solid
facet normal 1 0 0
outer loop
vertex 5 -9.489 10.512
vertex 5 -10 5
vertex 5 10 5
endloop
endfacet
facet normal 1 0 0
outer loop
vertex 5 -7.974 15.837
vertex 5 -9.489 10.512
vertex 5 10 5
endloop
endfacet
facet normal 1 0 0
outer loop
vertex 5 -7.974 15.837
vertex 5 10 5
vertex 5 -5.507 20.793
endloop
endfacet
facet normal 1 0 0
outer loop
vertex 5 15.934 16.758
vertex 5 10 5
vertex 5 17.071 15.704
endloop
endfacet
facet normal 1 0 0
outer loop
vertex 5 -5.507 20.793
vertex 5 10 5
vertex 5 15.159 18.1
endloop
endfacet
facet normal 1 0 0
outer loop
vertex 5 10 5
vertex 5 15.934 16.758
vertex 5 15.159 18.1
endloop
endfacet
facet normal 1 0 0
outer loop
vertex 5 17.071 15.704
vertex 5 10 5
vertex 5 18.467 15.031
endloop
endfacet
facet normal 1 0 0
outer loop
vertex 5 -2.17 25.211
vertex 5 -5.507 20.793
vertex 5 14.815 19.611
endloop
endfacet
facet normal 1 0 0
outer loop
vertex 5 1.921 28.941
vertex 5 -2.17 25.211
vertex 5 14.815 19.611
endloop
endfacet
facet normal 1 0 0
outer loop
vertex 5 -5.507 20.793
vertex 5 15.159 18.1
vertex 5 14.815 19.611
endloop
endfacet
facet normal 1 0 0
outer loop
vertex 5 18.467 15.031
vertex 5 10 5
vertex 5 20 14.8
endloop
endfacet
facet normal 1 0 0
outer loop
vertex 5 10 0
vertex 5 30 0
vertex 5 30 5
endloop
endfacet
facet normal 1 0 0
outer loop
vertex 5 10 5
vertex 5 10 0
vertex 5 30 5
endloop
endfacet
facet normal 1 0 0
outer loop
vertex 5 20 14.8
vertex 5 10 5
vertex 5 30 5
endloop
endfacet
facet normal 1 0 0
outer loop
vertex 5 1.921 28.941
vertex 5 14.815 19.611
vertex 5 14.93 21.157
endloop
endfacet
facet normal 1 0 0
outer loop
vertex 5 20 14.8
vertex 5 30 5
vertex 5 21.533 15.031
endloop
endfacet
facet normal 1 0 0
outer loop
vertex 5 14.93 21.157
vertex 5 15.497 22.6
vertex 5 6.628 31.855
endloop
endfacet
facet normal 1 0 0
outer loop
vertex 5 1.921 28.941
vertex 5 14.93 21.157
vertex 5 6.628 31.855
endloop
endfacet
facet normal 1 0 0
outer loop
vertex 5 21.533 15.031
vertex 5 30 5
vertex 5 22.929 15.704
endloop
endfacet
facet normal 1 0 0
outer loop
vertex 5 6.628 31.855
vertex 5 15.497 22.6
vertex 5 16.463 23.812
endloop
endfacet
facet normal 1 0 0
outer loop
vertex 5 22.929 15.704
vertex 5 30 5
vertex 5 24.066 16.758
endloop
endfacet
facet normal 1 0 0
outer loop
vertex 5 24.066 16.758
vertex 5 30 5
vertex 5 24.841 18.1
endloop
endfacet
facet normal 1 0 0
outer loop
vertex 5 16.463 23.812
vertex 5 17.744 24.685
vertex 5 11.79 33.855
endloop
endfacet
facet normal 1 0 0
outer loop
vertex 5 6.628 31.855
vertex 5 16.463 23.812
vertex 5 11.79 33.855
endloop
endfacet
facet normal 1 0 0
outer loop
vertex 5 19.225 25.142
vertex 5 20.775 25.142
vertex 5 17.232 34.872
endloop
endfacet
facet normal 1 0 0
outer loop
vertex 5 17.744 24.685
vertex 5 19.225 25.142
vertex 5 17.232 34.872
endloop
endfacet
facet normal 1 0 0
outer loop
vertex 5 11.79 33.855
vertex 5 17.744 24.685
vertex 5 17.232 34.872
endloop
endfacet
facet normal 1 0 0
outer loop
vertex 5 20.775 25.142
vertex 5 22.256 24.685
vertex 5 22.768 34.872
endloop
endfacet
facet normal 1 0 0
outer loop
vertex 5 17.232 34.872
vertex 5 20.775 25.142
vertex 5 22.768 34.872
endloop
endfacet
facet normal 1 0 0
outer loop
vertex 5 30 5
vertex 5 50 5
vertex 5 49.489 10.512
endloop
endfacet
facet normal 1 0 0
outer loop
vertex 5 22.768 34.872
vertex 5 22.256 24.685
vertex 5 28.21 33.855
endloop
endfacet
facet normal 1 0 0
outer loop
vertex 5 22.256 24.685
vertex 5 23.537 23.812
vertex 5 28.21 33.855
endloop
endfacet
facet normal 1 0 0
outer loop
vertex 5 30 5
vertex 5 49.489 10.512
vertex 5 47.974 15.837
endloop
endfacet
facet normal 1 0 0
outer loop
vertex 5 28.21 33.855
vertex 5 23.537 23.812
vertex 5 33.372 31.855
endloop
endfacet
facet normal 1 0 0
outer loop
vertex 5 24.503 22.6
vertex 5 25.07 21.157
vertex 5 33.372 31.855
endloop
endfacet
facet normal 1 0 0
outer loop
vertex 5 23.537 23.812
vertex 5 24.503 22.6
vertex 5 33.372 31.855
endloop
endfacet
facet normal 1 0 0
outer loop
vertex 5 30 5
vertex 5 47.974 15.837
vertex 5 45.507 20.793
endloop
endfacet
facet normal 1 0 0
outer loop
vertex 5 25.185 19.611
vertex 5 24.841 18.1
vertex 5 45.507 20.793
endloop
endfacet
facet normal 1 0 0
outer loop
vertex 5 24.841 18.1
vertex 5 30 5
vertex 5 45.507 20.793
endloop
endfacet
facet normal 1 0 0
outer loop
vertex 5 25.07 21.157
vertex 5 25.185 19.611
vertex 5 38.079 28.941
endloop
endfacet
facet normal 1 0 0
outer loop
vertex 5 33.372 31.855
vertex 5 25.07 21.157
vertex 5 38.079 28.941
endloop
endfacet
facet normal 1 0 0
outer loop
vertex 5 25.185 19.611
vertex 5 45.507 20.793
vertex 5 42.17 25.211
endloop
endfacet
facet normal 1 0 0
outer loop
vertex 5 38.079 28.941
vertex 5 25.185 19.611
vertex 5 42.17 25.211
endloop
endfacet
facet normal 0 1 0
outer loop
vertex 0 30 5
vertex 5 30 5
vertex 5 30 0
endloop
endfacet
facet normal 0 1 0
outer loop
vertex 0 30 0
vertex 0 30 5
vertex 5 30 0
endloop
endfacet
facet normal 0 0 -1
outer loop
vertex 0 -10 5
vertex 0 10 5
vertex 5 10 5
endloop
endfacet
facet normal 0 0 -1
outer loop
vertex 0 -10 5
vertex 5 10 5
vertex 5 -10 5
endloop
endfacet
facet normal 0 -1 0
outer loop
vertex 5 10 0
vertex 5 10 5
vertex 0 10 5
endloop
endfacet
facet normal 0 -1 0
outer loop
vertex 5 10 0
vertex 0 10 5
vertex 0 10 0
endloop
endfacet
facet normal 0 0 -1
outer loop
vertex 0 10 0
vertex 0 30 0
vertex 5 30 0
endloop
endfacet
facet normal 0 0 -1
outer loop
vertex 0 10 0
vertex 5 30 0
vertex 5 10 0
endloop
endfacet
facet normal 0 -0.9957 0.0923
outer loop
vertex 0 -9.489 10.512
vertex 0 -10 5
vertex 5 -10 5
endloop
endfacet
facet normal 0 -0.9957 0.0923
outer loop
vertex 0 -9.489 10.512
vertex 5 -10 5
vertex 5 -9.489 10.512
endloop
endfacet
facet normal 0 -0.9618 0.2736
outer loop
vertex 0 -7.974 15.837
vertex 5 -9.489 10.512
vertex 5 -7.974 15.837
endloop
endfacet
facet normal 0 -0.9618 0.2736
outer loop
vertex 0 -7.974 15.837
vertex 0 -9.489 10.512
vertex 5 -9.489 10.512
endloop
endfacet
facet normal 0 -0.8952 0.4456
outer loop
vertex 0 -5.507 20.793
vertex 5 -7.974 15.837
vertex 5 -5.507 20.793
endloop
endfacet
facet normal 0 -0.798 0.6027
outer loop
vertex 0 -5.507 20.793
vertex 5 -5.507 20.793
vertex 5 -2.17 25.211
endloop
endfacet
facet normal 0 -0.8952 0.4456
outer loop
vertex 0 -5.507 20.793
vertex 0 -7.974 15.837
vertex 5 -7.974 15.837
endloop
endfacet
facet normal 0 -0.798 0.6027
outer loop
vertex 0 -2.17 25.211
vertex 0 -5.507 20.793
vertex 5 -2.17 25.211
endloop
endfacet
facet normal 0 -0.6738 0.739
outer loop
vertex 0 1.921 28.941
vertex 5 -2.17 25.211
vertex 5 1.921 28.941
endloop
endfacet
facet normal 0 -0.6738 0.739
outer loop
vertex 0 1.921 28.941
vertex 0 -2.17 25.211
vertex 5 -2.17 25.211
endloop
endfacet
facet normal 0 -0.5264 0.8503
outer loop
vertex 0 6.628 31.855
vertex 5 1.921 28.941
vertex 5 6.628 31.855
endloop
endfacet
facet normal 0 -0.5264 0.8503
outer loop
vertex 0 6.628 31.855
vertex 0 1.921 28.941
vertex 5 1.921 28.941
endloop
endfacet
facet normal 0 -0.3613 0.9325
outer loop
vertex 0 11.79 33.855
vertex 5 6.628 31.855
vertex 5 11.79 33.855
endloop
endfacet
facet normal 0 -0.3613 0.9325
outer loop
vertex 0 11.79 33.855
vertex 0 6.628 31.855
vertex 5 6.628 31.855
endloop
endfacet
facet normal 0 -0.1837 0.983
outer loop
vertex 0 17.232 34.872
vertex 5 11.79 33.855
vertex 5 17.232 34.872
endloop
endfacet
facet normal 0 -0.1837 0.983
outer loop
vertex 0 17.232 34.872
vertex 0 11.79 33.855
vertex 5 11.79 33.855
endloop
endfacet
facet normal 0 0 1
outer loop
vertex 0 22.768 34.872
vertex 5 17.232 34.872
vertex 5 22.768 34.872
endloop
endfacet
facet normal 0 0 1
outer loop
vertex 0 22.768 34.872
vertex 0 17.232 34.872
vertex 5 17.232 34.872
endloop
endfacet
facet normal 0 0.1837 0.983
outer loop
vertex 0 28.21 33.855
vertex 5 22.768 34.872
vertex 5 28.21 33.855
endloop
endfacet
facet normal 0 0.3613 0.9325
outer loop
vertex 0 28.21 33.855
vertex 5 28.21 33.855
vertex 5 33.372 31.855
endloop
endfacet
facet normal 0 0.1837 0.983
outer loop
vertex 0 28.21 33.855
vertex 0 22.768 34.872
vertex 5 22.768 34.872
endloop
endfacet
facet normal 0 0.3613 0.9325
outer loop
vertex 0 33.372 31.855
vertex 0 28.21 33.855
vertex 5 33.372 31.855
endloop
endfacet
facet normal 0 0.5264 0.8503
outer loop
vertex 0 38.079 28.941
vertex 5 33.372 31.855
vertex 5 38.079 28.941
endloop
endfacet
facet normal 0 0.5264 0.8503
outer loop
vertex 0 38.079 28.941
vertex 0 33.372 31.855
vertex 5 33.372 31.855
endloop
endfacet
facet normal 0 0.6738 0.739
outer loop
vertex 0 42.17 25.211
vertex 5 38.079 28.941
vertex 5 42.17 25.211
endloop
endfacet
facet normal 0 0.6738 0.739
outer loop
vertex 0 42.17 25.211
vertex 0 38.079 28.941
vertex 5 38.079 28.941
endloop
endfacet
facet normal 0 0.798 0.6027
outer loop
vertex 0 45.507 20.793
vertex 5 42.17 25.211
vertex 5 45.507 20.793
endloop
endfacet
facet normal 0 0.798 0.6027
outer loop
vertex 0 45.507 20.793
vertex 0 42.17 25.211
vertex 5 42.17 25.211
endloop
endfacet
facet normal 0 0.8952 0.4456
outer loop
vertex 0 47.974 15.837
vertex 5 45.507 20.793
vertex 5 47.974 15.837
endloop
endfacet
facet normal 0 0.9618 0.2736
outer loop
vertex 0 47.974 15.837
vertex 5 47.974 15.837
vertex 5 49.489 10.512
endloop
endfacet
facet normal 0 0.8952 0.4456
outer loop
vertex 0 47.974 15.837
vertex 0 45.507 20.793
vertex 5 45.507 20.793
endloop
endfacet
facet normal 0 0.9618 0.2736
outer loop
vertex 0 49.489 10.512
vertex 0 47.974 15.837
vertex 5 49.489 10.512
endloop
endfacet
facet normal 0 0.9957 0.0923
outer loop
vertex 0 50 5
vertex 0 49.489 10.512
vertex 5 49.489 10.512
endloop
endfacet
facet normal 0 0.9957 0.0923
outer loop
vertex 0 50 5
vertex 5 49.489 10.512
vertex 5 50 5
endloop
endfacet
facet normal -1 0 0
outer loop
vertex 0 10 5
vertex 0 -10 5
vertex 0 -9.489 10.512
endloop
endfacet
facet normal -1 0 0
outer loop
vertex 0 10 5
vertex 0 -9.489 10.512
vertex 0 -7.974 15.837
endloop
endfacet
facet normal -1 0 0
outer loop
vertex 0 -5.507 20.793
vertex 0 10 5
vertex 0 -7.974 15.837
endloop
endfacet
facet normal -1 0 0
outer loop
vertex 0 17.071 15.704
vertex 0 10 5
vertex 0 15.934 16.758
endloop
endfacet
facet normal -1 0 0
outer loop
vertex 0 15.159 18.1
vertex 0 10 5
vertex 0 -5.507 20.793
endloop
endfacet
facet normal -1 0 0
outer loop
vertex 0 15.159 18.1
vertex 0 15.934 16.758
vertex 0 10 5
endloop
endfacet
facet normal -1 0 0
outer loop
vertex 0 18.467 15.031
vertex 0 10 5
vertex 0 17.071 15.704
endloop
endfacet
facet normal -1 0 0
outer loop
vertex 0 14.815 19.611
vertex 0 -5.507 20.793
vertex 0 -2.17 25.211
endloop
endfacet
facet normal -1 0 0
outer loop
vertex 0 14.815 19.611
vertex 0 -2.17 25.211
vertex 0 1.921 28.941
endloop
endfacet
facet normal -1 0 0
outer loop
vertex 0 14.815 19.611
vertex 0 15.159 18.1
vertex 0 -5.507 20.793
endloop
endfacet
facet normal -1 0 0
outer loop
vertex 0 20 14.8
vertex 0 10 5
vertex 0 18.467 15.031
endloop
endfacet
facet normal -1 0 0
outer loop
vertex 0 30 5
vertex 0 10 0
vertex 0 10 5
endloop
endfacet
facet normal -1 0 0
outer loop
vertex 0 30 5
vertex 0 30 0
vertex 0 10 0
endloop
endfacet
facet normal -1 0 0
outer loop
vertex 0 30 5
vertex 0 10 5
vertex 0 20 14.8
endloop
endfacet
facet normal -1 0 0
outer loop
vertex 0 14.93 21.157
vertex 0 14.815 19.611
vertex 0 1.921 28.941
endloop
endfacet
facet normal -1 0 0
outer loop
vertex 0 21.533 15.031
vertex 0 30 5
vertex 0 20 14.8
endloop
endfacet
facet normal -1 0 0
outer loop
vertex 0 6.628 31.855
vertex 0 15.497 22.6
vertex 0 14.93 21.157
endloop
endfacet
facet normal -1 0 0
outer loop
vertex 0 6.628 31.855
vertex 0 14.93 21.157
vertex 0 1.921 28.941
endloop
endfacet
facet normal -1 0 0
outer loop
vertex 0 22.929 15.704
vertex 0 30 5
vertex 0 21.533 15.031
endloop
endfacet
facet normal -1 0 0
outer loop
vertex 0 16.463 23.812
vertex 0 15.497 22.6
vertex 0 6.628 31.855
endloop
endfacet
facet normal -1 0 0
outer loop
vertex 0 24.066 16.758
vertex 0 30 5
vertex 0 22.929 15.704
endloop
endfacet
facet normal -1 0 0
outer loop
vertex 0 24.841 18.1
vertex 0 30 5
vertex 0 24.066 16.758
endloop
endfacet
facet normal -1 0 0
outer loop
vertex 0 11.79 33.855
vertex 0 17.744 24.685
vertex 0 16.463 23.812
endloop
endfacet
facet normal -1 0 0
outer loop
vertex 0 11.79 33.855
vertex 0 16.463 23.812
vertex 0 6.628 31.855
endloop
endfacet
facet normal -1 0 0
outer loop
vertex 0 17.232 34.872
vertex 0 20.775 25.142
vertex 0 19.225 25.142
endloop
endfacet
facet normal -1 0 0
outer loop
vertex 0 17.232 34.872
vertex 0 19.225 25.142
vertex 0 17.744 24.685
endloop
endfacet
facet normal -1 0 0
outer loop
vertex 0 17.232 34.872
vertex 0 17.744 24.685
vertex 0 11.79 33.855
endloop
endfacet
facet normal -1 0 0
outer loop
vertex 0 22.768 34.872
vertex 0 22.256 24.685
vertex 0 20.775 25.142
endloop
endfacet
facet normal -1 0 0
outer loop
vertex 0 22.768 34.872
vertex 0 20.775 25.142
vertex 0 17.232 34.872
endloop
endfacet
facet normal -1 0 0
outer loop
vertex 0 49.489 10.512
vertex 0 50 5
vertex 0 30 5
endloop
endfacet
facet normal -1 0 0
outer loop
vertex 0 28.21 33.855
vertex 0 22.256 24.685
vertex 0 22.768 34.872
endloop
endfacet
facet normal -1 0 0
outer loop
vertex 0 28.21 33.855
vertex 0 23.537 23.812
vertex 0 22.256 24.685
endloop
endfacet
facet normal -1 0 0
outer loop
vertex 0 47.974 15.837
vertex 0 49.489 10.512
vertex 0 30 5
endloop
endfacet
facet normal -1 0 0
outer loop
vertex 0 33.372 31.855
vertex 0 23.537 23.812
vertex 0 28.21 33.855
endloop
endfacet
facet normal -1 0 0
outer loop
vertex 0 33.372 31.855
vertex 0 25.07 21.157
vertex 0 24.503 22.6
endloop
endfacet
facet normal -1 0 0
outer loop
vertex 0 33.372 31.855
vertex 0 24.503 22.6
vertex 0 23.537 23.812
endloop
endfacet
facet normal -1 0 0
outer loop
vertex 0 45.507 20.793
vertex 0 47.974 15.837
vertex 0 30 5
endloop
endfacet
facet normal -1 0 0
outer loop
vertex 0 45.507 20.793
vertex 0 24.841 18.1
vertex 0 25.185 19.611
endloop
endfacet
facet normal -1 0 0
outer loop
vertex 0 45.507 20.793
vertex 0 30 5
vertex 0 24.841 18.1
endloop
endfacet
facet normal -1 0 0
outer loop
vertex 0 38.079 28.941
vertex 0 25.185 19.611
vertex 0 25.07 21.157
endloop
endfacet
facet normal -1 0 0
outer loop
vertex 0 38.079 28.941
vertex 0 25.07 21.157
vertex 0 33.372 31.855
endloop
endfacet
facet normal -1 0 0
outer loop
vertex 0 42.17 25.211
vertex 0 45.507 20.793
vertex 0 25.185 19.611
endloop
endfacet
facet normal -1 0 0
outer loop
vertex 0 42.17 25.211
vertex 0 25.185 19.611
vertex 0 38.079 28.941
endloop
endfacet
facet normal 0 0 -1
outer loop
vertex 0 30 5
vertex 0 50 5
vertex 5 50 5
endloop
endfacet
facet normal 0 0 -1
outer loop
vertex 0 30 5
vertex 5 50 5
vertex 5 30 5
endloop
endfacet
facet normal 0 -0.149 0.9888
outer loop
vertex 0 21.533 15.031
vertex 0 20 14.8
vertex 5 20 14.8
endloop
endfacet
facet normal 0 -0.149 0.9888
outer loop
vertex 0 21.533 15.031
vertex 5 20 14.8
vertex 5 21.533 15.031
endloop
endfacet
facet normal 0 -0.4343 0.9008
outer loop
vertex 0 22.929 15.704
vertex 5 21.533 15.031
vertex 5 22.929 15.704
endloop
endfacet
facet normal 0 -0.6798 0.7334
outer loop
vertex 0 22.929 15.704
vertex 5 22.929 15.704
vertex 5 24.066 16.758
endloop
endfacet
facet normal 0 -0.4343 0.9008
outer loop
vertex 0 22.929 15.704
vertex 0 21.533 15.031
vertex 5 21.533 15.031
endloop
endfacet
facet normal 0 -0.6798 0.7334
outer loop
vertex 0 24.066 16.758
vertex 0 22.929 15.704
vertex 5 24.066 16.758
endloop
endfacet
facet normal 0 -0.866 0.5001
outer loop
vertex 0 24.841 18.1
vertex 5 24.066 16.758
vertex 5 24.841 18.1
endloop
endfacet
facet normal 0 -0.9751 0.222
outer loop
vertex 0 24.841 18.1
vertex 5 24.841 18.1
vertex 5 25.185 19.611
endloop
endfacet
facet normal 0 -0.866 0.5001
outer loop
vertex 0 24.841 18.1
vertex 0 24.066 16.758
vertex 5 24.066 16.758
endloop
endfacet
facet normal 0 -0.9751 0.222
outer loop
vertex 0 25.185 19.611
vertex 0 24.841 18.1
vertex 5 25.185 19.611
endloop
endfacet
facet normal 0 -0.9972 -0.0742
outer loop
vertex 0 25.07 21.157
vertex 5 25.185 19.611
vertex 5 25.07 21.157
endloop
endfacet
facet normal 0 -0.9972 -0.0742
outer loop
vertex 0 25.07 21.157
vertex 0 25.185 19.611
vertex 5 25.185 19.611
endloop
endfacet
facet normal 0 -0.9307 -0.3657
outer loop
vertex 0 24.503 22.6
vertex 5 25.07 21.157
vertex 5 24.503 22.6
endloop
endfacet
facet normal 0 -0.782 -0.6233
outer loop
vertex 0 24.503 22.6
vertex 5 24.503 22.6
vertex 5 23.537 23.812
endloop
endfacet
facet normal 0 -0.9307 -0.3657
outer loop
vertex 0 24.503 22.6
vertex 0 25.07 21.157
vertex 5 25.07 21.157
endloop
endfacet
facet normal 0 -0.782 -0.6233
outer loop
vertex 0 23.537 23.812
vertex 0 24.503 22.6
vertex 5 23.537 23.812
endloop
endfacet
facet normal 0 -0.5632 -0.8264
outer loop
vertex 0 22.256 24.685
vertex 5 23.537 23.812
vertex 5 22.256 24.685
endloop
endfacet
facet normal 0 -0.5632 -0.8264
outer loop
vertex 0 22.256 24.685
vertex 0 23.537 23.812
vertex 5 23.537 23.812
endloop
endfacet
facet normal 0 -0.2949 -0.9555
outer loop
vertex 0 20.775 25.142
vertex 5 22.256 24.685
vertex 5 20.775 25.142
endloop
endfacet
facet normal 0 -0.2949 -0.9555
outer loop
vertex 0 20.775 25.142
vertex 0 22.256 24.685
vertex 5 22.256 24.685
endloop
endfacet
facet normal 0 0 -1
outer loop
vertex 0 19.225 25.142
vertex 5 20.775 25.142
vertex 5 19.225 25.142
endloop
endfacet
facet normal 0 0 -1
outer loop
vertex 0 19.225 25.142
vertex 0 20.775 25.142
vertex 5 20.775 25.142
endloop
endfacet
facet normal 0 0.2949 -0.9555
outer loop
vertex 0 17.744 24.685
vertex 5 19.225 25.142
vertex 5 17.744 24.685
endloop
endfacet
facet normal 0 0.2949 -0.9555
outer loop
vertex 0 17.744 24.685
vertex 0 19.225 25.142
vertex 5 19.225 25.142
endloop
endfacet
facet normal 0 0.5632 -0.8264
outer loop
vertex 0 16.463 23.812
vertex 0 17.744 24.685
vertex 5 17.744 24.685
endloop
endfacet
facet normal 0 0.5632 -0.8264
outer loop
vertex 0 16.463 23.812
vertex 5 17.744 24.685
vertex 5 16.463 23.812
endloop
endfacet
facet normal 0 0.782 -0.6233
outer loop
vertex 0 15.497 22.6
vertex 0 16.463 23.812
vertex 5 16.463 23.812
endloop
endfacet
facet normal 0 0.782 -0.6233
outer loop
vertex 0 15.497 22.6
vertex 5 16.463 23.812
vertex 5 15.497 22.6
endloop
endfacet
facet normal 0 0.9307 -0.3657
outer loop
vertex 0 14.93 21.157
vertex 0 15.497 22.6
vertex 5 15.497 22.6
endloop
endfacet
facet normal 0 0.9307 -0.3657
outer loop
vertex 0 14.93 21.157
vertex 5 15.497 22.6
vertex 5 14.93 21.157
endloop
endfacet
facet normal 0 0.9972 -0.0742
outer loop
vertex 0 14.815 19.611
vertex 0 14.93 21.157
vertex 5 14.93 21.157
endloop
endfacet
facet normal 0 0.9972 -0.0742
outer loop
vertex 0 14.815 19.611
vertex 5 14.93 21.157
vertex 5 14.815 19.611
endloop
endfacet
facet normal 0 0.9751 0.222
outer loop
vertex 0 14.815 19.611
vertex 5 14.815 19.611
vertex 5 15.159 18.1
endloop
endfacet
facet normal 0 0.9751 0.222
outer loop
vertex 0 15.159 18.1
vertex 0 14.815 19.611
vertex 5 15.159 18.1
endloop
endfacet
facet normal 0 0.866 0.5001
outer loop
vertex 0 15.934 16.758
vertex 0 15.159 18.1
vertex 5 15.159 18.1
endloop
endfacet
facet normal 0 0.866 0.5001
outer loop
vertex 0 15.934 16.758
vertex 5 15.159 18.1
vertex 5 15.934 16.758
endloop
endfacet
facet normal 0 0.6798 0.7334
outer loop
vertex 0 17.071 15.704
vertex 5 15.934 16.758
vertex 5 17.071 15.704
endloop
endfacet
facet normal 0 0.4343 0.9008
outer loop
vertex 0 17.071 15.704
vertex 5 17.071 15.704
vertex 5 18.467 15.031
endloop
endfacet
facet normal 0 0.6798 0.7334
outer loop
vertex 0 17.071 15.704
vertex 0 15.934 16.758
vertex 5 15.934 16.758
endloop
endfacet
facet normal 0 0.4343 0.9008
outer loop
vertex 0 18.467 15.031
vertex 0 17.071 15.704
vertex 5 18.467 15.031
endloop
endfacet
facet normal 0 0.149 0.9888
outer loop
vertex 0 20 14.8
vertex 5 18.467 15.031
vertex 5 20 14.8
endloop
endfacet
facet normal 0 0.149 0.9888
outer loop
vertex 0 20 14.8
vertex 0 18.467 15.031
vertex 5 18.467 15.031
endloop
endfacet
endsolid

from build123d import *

# Parameters (mm, degrees)
SKETCH_1_R          = 5.2
EXTRUDE_1_DEPTH     = 5
SKETCH_2_W          = 5
SKETCH_2_H          = 10
CUT_EXTRUDE_1_DEPTH = 62.23724357


with BuildPart() as part:
    # Эскиз1 → Бобышка-Вытянуть1 (new body)
    with BuildSketch(Plane(origin=(0, 0, 0), x_dir=(0, 0, -1), z_dir=(1, 0, 0))):
        with BuildLine():
            Line((0, 0), (-5, 0))
            Line((-5, 0), (-5, -10))
            ThreePointArc((-5, -10), (-35, 20), (-5, 50))
            Line((-5, 50), (-5, 40))
            Line((-5, 40), (0, 40))
            Line((0, 40), (0, 0))
        make_face()
        with Locations((-20, 20)):
            Circle(SKETCH_1_R, mode=Mode.SUBTRACT)
    extrude(amount=EXTRUDE_1_DEPTH)

    # Эскиз2 → Вырез-Вытянуть1 (cut, through all)
    with BuildSketch(Plane(origin=(5, 0, 0), x_dir=(0, 0, -1), z_dir=(1, 0, 0))):
        with Locations((-2.5, 35)):
            Rectangle(SKETCH_2_W, SKETCH_2_H)
        with Locations((-2.5, 5)):
            Rectangle(SKETCH_2_W, SKETCH_2_H)
    extrude(amount=-CUT_EXTRUDE_1_DEPTH, mode=Mode.SUBTRACT)


solid = part.part
